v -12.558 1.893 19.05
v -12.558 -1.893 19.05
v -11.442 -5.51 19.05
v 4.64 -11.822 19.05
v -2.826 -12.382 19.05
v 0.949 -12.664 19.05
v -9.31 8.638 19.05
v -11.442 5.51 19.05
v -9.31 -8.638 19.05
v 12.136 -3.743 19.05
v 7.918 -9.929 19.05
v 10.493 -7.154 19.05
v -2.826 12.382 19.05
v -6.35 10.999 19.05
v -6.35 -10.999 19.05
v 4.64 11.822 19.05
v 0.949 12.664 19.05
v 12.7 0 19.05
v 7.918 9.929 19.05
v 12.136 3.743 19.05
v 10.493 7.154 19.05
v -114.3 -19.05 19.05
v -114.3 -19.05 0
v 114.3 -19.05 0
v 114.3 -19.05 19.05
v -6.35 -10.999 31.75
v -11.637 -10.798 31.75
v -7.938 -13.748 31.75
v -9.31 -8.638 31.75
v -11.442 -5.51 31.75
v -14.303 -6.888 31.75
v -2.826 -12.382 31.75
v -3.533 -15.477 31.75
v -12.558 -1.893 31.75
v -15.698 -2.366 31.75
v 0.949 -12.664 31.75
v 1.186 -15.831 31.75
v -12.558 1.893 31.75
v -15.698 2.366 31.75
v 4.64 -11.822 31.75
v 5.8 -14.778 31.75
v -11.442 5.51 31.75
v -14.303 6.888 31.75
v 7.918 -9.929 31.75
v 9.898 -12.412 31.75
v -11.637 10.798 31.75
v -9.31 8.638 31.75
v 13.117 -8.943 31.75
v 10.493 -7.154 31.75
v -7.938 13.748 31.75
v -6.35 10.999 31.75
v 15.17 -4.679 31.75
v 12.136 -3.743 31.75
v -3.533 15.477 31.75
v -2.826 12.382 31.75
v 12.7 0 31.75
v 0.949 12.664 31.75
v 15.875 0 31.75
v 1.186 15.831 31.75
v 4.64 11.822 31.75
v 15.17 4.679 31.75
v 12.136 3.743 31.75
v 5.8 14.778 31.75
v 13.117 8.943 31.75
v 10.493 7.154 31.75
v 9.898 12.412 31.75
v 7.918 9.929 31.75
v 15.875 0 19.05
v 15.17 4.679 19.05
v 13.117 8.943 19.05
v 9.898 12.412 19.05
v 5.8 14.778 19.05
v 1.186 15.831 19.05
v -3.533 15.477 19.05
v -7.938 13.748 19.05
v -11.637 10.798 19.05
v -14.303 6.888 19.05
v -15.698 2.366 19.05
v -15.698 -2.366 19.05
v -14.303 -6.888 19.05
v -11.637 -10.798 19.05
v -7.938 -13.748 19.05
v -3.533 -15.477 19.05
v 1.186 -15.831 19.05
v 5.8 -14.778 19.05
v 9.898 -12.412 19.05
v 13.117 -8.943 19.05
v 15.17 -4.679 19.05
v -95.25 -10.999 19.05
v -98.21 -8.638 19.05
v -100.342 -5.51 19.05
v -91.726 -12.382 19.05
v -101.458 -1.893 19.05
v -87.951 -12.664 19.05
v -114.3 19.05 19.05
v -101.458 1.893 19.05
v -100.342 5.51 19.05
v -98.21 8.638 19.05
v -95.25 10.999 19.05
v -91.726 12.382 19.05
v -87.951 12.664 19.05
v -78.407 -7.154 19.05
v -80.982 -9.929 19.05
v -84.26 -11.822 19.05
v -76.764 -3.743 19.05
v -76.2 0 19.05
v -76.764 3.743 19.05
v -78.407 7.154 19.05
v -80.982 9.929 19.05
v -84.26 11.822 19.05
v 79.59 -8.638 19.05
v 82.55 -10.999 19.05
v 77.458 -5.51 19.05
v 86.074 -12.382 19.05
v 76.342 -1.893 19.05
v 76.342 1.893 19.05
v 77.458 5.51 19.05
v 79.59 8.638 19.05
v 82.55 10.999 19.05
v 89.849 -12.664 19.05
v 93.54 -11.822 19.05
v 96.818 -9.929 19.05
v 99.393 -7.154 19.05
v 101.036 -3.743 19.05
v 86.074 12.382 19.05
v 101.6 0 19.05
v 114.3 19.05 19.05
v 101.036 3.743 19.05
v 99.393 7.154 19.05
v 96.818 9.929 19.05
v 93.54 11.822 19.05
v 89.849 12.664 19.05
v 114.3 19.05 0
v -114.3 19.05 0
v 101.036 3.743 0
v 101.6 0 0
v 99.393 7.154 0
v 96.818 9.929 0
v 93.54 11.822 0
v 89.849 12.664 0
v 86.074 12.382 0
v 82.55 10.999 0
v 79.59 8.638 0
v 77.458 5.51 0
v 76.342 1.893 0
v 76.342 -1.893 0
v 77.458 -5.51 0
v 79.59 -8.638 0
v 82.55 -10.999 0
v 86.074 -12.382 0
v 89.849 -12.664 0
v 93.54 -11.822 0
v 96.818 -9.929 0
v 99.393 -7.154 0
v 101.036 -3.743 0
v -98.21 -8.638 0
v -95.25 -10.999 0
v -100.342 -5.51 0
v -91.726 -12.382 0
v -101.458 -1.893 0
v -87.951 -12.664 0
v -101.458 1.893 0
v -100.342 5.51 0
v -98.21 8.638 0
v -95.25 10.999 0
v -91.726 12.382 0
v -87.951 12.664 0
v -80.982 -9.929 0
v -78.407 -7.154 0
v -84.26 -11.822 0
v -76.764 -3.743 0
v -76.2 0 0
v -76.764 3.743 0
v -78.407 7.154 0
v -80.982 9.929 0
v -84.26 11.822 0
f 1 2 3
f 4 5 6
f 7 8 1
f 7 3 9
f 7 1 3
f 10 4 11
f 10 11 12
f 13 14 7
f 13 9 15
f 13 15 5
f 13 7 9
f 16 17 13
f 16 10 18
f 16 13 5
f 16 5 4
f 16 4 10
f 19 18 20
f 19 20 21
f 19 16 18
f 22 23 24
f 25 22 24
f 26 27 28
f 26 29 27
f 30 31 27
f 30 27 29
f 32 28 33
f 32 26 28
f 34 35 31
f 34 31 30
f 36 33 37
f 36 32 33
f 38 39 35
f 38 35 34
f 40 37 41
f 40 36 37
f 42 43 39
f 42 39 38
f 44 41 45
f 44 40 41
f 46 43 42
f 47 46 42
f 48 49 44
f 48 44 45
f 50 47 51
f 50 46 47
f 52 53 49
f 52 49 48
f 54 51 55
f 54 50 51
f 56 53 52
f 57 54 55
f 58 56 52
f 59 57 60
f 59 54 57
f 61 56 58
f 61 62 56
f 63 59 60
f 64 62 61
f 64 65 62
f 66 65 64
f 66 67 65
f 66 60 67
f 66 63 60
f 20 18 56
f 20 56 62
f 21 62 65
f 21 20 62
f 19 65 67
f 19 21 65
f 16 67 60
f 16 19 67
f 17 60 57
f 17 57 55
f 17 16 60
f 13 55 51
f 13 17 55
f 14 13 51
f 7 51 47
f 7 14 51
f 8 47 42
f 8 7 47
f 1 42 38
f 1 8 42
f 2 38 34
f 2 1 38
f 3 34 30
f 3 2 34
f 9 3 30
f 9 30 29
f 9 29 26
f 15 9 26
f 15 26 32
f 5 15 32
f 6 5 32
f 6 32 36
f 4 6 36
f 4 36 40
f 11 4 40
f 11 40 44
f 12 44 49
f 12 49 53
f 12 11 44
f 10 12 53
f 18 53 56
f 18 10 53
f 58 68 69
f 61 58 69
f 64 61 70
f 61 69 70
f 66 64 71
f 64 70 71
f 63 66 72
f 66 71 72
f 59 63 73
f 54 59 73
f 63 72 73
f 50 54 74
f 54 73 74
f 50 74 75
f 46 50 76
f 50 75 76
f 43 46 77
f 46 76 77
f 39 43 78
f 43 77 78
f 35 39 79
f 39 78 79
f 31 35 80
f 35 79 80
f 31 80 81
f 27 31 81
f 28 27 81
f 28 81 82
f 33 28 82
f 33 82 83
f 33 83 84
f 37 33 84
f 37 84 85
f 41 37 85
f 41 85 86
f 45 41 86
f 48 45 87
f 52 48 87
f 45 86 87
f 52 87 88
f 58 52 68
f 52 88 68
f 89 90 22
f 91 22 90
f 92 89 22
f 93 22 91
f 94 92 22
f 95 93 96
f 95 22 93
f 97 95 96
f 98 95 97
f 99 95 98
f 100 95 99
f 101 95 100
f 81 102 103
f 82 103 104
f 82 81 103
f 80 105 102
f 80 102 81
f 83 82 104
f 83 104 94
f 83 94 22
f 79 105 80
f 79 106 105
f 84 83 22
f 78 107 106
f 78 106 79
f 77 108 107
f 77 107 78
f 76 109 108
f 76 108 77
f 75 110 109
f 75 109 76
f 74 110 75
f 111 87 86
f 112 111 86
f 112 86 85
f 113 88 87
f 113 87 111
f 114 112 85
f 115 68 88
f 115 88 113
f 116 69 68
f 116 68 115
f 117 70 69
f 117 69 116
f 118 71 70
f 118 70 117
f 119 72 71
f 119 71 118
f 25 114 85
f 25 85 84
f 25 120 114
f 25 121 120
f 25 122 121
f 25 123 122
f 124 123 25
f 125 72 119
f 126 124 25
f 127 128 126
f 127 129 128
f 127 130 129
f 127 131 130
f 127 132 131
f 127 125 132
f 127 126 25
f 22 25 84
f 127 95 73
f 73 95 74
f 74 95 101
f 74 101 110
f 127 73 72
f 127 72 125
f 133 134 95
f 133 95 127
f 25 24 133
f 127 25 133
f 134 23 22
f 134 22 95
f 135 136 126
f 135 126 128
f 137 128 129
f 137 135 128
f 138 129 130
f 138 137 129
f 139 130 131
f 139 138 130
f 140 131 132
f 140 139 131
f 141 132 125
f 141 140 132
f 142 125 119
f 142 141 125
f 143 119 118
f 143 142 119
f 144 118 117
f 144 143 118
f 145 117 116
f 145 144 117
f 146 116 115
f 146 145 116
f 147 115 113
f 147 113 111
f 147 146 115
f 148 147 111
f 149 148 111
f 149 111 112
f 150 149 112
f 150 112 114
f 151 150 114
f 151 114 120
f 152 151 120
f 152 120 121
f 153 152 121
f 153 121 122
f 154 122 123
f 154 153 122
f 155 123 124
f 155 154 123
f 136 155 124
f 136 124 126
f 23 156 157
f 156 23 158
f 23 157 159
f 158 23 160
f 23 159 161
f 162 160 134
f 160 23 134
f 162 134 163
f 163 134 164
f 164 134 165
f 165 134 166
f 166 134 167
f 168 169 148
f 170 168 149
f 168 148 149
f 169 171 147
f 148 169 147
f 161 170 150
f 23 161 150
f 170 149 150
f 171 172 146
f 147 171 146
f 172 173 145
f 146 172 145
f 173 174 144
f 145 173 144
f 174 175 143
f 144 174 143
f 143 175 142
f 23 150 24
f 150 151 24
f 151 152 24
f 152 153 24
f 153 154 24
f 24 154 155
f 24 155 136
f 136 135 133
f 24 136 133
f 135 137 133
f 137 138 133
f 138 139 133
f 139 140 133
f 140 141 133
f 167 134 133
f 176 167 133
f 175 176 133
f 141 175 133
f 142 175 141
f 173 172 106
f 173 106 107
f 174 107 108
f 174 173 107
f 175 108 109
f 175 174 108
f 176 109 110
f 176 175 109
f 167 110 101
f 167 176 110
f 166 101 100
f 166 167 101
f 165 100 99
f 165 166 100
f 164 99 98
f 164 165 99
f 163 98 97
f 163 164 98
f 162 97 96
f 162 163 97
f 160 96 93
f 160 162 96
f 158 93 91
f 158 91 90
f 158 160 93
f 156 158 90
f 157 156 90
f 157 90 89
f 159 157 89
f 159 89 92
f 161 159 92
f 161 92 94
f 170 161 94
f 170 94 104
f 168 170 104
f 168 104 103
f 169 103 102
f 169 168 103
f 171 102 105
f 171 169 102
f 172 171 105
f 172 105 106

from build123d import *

# Parameters (mm, degrees)
F0_W     = 228.6
F0_H     = 38.1
F0_R     = 12.7
F1_DEPTH = 19.05
F2_R     = 15.875
F2_R_2   = 12.7
F3_DEPTH = 12.7


with BuildPart() as f1:
    # F0 (on Top) → F1 (new body)
    with BuildSketch(Plane.XY):
        Rectangle(F0_W, F0_H)
        with Locations((-88.9, 0)):
            Circle(F0_R, mode=Mode.SUBTRACT)
        with Locations((88.9, 0)):
            Circle(F0_R, mode=Mode.SUBTRACT)
    extrude(amount=F1_DEPTH)

    # F2 (on face) → F3 (join)
    with BuildSketch(Plane.XY.offset(19.05)):
        Circle(F2_R)
        Circle(F2_R_2, mode=Mode.SUBTRACT)
    extrude(amount=F3_DEPTH)


solid = f1.part
